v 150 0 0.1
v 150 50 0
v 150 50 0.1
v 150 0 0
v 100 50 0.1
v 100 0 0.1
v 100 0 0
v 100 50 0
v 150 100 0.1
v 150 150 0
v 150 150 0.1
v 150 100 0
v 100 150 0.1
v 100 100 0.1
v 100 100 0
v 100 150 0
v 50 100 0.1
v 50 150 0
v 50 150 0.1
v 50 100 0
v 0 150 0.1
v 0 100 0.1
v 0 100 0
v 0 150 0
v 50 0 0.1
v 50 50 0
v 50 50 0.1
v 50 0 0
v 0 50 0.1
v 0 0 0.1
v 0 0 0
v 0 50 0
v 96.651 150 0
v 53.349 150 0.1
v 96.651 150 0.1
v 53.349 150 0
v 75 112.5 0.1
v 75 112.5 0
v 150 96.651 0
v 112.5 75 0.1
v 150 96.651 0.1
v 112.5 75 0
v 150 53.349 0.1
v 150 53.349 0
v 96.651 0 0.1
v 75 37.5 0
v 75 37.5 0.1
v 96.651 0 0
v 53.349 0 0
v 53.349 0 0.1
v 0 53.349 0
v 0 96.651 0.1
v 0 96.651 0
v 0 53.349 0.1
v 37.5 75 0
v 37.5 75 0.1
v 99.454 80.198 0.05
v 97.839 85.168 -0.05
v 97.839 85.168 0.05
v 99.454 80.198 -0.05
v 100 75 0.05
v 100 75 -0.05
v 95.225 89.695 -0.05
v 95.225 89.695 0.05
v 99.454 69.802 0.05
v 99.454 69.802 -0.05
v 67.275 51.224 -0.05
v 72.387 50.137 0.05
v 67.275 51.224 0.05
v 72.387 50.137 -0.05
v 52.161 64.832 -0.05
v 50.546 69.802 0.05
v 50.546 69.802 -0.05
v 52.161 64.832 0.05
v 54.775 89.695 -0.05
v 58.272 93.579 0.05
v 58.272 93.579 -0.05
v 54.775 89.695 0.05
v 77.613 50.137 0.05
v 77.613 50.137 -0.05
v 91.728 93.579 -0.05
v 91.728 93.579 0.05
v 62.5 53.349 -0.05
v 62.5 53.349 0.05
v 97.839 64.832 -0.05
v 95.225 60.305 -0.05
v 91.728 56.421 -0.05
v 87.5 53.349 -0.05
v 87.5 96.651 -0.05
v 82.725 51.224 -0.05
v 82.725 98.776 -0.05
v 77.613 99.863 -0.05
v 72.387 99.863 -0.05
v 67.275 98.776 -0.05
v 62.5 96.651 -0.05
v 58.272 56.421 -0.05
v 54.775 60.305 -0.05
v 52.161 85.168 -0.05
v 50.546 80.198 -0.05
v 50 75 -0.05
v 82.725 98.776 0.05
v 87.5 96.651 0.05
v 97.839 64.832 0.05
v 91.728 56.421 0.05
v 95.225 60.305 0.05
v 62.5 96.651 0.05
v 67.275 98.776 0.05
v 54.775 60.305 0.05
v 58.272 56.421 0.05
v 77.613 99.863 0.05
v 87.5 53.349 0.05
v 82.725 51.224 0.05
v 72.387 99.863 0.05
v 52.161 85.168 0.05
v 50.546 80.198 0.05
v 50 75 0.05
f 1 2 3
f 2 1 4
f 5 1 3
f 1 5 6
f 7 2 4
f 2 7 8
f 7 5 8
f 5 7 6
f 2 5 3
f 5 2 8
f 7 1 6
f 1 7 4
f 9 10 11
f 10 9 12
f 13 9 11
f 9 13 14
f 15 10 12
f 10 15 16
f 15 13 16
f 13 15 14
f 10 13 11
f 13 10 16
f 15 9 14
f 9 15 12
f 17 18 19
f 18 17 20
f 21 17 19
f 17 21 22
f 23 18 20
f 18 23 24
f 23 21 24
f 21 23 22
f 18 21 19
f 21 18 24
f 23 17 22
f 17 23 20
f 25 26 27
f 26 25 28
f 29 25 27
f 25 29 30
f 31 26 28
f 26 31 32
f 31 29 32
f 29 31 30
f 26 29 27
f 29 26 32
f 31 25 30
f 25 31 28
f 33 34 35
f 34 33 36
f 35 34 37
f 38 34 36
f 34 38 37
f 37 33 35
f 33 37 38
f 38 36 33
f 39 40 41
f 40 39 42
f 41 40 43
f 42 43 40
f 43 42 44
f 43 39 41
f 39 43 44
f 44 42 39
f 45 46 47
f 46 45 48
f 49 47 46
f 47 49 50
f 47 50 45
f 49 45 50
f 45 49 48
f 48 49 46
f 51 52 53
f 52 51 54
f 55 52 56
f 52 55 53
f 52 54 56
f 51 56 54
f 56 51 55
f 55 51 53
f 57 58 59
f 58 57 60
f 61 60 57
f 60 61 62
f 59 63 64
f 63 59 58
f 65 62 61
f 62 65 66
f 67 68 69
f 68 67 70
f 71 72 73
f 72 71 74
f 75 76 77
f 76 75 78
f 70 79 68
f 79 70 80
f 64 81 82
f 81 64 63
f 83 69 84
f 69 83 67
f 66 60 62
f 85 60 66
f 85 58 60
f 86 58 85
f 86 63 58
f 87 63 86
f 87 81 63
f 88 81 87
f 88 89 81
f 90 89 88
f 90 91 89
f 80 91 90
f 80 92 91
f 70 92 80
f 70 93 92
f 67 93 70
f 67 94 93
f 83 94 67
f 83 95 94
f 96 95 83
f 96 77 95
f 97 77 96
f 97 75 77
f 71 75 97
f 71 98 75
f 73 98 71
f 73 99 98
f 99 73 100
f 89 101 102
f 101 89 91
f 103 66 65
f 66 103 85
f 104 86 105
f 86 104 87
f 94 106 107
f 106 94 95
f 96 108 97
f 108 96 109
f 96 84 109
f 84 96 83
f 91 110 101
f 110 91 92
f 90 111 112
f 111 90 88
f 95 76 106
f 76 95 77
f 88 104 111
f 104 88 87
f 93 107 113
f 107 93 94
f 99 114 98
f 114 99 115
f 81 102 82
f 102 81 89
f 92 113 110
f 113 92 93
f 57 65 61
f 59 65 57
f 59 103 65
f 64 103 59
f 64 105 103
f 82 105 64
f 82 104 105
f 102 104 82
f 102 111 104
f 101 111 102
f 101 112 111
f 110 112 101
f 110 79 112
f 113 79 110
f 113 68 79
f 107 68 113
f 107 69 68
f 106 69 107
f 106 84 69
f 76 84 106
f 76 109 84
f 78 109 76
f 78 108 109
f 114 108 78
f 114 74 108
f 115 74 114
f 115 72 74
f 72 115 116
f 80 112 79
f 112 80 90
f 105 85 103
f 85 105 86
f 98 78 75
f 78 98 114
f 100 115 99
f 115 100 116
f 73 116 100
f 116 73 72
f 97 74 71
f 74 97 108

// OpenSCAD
bed_max_x = 150;
bed_max_y = 150;
plate_size = 50;
height = .1;
triangle_factor = 1.25;

module four_corners() {
    translate([bed_max_x-plate_size,0,0]){
        cube([plate_size,plate_size,height]);
    }
    translate([bed_max_x-plate_size,bed_max_y-plate_size,0]){
        cube([plate_size,plate_size,height]);
    }

    translate([0,bed_max_y-plate_size,0]){
        cube([plate_size,plate_size,height]);
    }

    cube([plate_size,plate_size,height]);
}

module edge_triangles() {
    translate([bed_max_x/2,bed_max_y/2,0]) {
        
        translate([0,plate_size*triangle_factor,0]){
            rotate([0,0,30]) {
                cylinder(r=plate_size/2, h=height, $fn=3);
            }
        }
        
        translate([plate_size*triangle_factor,0,0]){
            rotate([0,0,60]) {
                cylinder(r=plate_size/2, h=height, $fn=3);
            }
        }

        translate([0,(plate_size*triangle_factor)*-1,0]){
            rotate([0,0,90]) {
                cylinder(r=plate_size/2, h=height, $fn=3);
            }
        }

        translate([(plate_size*triangle_factor)*-1,0,0]){
            rotate([0,0,0]) {
                cylinder(r=plate_size/2, h=height, $fn=3);
            }
        }

    }
    
}


module center_point() {
    translate([bed_max_x/2,bed_max_y/2,0]) {
        cylinder(r=plate_size/2, h=height, center=true);
    }
}
    
four_corners();
center_point();
edge_triangles();
